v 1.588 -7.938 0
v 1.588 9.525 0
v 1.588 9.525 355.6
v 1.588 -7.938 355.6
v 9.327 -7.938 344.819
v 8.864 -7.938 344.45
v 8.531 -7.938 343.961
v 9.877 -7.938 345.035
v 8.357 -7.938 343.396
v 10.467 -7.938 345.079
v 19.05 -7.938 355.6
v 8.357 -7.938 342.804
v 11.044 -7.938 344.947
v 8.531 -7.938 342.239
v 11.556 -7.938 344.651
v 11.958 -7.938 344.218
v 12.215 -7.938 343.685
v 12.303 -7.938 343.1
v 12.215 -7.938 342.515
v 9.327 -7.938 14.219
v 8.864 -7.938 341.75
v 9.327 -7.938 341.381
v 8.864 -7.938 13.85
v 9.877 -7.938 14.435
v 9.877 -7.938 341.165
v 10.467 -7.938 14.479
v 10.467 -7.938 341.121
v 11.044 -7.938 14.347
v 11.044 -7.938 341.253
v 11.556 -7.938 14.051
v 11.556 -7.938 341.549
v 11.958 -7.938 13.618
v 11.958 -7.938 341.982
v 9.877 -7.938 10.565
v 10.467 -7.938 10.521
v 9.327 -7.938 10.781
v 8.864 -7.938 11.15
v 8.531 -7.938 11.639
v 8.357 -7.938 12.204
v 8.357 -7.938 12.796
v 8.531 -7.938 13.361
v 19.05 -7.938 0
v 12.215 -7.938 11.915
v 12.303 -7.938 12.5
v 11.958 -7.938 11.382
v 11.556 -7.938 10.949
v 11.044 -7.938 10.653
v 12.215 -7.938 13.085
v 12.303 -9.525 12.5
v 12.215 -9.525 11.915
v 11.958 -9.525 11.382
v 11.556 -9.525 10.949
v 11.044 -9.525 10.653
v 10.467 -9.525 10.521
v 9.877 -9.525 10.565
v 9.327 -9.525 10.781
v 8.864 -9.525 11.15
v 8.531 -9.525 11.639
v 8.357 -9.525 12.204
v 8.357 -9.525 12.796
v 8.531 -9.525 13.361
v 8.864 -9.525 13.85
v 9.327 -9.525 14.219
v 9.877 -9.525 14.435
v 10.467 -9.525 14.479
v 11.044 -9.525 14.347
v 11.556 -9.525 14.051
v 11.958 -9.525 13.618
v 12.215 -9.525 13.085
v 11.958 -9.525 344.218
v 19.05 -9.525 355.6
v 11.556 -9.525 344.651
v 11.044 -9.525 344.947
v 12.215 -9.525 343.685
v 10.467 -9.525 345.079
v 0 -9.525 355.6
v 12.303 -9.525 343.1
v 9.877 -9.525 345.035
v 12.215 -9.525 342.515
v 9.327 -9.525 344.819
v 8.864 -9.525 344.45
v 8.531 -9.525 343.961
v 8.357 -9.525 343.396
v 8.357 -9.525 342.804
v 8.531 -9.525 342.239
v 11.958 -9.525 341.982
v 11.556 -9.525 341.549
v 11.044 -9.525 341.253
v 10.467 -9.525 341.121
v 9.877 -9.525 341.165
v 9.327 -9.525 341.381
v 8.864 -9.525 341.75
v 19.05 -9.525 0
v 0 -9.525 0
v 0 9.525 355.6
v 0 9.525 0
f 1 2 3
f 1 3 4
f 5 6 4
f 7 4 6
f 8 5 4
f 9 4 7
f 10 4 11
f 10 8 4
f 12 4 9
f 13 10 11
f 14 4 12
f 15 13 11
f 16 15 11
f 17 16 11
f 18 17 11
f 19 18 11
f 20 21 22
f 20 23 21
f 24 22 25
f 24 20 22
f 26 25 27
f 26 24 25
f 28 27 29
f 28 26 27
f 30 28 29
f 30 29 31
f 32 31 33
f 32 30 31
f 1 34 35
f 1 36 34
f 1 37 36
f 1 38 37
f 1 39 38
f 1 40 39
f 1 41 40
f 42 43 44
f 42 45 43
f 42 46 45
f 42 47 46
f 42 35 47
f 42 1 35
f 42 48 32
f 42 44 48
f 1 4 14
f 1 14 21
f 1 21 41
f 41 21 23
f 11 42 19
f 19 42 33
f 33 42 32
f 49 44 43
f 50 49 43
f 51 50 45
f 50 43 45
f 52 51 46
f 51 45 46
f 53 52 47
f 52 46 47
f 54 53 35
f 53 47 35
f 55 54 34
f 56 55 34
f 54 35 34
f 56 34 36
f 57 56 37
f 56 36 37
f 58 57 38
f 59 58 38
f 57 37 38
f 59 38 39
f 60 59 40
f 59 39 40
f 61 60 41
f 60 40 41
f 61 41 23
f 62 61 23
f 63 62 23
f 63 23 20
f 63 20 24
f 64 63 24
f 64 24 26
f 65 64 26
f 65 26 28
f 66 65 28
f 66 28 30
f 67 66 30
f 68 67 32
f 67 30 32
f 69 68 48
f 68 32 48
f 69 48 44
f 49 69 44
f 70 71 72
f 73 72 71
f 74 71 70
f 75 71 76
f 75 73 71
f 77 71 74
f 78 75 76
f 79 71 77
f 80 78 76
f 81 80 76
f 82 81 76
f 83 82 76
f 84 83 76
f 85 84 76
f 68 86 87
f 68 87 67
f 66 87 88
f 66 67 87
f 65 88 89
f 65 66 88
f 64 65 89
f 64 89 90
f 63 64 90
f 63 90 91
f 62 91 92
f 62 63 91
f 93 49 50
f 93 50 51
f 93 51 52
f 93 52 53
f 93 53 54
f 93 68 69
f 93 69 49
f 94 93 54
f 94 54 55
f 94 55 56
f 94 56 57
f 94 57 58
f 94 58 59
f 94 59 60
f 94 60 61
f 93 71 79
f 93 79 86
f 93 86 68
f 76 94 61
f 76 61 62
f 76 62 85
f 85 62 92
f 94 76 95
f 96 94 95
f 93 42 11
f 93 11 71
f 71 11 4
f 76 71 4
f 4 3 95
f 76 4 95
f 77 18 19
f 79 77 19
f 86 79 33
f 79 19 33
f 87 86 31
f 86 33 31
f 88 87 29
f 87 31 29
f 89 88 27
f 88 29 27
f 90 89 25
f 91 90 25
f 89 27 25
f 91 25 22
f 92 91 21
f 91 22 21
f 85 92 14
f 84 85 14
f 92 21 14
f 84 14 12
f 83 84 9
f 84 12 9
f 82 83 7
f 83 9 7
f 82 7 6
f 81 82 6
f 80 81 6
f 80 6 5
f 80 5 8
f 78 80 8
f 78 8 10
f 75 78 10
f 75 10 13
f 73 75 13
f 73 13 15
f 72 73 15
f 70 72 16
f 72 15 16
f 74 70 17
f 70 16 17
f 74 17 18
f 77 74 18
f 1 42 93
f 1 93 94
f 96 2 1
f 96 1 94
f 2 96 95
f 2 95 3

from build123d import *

# Parameters (mm, degrees)
BOSS_EXTRUDE1_DEPTH = 355.6
SKETCH3_R           = 1.984375
CUT_EXTRUDE1_DEPTH  = 1.5875


with BuildPart() as part:
    # Sketch2 → Boss-Extrude1 (new body)
    with BuildSketch(Plane.XY):
        Polygon((0, -9.525), (0, 9.525), (1.5875, 9.525), (1.5875, -7.9375), (19.05, -7.9375), (19.05, -9.525), align=None)
    extrude(amount=BOSS_EXTRUDE1_DEPTH)

    # Sketch3 → Cut-Extrude1 (cut)
    with BuildSketch(Plane(origin=(0, -7.9375, 0), x_dir=(1, 0, 0), z_dir=(0, 1, 0))):
        with Locations((10.31875, -12.5)):
            Circle(SKETCH3_R)
        with Locations((10.31875, -343.1)):
            Circle(SKETCH3_R)
    extrude(amount=-CUT_EXTRUDE1_DEPTH, mode=Mode.SUBTRACT)


solid = part.part
